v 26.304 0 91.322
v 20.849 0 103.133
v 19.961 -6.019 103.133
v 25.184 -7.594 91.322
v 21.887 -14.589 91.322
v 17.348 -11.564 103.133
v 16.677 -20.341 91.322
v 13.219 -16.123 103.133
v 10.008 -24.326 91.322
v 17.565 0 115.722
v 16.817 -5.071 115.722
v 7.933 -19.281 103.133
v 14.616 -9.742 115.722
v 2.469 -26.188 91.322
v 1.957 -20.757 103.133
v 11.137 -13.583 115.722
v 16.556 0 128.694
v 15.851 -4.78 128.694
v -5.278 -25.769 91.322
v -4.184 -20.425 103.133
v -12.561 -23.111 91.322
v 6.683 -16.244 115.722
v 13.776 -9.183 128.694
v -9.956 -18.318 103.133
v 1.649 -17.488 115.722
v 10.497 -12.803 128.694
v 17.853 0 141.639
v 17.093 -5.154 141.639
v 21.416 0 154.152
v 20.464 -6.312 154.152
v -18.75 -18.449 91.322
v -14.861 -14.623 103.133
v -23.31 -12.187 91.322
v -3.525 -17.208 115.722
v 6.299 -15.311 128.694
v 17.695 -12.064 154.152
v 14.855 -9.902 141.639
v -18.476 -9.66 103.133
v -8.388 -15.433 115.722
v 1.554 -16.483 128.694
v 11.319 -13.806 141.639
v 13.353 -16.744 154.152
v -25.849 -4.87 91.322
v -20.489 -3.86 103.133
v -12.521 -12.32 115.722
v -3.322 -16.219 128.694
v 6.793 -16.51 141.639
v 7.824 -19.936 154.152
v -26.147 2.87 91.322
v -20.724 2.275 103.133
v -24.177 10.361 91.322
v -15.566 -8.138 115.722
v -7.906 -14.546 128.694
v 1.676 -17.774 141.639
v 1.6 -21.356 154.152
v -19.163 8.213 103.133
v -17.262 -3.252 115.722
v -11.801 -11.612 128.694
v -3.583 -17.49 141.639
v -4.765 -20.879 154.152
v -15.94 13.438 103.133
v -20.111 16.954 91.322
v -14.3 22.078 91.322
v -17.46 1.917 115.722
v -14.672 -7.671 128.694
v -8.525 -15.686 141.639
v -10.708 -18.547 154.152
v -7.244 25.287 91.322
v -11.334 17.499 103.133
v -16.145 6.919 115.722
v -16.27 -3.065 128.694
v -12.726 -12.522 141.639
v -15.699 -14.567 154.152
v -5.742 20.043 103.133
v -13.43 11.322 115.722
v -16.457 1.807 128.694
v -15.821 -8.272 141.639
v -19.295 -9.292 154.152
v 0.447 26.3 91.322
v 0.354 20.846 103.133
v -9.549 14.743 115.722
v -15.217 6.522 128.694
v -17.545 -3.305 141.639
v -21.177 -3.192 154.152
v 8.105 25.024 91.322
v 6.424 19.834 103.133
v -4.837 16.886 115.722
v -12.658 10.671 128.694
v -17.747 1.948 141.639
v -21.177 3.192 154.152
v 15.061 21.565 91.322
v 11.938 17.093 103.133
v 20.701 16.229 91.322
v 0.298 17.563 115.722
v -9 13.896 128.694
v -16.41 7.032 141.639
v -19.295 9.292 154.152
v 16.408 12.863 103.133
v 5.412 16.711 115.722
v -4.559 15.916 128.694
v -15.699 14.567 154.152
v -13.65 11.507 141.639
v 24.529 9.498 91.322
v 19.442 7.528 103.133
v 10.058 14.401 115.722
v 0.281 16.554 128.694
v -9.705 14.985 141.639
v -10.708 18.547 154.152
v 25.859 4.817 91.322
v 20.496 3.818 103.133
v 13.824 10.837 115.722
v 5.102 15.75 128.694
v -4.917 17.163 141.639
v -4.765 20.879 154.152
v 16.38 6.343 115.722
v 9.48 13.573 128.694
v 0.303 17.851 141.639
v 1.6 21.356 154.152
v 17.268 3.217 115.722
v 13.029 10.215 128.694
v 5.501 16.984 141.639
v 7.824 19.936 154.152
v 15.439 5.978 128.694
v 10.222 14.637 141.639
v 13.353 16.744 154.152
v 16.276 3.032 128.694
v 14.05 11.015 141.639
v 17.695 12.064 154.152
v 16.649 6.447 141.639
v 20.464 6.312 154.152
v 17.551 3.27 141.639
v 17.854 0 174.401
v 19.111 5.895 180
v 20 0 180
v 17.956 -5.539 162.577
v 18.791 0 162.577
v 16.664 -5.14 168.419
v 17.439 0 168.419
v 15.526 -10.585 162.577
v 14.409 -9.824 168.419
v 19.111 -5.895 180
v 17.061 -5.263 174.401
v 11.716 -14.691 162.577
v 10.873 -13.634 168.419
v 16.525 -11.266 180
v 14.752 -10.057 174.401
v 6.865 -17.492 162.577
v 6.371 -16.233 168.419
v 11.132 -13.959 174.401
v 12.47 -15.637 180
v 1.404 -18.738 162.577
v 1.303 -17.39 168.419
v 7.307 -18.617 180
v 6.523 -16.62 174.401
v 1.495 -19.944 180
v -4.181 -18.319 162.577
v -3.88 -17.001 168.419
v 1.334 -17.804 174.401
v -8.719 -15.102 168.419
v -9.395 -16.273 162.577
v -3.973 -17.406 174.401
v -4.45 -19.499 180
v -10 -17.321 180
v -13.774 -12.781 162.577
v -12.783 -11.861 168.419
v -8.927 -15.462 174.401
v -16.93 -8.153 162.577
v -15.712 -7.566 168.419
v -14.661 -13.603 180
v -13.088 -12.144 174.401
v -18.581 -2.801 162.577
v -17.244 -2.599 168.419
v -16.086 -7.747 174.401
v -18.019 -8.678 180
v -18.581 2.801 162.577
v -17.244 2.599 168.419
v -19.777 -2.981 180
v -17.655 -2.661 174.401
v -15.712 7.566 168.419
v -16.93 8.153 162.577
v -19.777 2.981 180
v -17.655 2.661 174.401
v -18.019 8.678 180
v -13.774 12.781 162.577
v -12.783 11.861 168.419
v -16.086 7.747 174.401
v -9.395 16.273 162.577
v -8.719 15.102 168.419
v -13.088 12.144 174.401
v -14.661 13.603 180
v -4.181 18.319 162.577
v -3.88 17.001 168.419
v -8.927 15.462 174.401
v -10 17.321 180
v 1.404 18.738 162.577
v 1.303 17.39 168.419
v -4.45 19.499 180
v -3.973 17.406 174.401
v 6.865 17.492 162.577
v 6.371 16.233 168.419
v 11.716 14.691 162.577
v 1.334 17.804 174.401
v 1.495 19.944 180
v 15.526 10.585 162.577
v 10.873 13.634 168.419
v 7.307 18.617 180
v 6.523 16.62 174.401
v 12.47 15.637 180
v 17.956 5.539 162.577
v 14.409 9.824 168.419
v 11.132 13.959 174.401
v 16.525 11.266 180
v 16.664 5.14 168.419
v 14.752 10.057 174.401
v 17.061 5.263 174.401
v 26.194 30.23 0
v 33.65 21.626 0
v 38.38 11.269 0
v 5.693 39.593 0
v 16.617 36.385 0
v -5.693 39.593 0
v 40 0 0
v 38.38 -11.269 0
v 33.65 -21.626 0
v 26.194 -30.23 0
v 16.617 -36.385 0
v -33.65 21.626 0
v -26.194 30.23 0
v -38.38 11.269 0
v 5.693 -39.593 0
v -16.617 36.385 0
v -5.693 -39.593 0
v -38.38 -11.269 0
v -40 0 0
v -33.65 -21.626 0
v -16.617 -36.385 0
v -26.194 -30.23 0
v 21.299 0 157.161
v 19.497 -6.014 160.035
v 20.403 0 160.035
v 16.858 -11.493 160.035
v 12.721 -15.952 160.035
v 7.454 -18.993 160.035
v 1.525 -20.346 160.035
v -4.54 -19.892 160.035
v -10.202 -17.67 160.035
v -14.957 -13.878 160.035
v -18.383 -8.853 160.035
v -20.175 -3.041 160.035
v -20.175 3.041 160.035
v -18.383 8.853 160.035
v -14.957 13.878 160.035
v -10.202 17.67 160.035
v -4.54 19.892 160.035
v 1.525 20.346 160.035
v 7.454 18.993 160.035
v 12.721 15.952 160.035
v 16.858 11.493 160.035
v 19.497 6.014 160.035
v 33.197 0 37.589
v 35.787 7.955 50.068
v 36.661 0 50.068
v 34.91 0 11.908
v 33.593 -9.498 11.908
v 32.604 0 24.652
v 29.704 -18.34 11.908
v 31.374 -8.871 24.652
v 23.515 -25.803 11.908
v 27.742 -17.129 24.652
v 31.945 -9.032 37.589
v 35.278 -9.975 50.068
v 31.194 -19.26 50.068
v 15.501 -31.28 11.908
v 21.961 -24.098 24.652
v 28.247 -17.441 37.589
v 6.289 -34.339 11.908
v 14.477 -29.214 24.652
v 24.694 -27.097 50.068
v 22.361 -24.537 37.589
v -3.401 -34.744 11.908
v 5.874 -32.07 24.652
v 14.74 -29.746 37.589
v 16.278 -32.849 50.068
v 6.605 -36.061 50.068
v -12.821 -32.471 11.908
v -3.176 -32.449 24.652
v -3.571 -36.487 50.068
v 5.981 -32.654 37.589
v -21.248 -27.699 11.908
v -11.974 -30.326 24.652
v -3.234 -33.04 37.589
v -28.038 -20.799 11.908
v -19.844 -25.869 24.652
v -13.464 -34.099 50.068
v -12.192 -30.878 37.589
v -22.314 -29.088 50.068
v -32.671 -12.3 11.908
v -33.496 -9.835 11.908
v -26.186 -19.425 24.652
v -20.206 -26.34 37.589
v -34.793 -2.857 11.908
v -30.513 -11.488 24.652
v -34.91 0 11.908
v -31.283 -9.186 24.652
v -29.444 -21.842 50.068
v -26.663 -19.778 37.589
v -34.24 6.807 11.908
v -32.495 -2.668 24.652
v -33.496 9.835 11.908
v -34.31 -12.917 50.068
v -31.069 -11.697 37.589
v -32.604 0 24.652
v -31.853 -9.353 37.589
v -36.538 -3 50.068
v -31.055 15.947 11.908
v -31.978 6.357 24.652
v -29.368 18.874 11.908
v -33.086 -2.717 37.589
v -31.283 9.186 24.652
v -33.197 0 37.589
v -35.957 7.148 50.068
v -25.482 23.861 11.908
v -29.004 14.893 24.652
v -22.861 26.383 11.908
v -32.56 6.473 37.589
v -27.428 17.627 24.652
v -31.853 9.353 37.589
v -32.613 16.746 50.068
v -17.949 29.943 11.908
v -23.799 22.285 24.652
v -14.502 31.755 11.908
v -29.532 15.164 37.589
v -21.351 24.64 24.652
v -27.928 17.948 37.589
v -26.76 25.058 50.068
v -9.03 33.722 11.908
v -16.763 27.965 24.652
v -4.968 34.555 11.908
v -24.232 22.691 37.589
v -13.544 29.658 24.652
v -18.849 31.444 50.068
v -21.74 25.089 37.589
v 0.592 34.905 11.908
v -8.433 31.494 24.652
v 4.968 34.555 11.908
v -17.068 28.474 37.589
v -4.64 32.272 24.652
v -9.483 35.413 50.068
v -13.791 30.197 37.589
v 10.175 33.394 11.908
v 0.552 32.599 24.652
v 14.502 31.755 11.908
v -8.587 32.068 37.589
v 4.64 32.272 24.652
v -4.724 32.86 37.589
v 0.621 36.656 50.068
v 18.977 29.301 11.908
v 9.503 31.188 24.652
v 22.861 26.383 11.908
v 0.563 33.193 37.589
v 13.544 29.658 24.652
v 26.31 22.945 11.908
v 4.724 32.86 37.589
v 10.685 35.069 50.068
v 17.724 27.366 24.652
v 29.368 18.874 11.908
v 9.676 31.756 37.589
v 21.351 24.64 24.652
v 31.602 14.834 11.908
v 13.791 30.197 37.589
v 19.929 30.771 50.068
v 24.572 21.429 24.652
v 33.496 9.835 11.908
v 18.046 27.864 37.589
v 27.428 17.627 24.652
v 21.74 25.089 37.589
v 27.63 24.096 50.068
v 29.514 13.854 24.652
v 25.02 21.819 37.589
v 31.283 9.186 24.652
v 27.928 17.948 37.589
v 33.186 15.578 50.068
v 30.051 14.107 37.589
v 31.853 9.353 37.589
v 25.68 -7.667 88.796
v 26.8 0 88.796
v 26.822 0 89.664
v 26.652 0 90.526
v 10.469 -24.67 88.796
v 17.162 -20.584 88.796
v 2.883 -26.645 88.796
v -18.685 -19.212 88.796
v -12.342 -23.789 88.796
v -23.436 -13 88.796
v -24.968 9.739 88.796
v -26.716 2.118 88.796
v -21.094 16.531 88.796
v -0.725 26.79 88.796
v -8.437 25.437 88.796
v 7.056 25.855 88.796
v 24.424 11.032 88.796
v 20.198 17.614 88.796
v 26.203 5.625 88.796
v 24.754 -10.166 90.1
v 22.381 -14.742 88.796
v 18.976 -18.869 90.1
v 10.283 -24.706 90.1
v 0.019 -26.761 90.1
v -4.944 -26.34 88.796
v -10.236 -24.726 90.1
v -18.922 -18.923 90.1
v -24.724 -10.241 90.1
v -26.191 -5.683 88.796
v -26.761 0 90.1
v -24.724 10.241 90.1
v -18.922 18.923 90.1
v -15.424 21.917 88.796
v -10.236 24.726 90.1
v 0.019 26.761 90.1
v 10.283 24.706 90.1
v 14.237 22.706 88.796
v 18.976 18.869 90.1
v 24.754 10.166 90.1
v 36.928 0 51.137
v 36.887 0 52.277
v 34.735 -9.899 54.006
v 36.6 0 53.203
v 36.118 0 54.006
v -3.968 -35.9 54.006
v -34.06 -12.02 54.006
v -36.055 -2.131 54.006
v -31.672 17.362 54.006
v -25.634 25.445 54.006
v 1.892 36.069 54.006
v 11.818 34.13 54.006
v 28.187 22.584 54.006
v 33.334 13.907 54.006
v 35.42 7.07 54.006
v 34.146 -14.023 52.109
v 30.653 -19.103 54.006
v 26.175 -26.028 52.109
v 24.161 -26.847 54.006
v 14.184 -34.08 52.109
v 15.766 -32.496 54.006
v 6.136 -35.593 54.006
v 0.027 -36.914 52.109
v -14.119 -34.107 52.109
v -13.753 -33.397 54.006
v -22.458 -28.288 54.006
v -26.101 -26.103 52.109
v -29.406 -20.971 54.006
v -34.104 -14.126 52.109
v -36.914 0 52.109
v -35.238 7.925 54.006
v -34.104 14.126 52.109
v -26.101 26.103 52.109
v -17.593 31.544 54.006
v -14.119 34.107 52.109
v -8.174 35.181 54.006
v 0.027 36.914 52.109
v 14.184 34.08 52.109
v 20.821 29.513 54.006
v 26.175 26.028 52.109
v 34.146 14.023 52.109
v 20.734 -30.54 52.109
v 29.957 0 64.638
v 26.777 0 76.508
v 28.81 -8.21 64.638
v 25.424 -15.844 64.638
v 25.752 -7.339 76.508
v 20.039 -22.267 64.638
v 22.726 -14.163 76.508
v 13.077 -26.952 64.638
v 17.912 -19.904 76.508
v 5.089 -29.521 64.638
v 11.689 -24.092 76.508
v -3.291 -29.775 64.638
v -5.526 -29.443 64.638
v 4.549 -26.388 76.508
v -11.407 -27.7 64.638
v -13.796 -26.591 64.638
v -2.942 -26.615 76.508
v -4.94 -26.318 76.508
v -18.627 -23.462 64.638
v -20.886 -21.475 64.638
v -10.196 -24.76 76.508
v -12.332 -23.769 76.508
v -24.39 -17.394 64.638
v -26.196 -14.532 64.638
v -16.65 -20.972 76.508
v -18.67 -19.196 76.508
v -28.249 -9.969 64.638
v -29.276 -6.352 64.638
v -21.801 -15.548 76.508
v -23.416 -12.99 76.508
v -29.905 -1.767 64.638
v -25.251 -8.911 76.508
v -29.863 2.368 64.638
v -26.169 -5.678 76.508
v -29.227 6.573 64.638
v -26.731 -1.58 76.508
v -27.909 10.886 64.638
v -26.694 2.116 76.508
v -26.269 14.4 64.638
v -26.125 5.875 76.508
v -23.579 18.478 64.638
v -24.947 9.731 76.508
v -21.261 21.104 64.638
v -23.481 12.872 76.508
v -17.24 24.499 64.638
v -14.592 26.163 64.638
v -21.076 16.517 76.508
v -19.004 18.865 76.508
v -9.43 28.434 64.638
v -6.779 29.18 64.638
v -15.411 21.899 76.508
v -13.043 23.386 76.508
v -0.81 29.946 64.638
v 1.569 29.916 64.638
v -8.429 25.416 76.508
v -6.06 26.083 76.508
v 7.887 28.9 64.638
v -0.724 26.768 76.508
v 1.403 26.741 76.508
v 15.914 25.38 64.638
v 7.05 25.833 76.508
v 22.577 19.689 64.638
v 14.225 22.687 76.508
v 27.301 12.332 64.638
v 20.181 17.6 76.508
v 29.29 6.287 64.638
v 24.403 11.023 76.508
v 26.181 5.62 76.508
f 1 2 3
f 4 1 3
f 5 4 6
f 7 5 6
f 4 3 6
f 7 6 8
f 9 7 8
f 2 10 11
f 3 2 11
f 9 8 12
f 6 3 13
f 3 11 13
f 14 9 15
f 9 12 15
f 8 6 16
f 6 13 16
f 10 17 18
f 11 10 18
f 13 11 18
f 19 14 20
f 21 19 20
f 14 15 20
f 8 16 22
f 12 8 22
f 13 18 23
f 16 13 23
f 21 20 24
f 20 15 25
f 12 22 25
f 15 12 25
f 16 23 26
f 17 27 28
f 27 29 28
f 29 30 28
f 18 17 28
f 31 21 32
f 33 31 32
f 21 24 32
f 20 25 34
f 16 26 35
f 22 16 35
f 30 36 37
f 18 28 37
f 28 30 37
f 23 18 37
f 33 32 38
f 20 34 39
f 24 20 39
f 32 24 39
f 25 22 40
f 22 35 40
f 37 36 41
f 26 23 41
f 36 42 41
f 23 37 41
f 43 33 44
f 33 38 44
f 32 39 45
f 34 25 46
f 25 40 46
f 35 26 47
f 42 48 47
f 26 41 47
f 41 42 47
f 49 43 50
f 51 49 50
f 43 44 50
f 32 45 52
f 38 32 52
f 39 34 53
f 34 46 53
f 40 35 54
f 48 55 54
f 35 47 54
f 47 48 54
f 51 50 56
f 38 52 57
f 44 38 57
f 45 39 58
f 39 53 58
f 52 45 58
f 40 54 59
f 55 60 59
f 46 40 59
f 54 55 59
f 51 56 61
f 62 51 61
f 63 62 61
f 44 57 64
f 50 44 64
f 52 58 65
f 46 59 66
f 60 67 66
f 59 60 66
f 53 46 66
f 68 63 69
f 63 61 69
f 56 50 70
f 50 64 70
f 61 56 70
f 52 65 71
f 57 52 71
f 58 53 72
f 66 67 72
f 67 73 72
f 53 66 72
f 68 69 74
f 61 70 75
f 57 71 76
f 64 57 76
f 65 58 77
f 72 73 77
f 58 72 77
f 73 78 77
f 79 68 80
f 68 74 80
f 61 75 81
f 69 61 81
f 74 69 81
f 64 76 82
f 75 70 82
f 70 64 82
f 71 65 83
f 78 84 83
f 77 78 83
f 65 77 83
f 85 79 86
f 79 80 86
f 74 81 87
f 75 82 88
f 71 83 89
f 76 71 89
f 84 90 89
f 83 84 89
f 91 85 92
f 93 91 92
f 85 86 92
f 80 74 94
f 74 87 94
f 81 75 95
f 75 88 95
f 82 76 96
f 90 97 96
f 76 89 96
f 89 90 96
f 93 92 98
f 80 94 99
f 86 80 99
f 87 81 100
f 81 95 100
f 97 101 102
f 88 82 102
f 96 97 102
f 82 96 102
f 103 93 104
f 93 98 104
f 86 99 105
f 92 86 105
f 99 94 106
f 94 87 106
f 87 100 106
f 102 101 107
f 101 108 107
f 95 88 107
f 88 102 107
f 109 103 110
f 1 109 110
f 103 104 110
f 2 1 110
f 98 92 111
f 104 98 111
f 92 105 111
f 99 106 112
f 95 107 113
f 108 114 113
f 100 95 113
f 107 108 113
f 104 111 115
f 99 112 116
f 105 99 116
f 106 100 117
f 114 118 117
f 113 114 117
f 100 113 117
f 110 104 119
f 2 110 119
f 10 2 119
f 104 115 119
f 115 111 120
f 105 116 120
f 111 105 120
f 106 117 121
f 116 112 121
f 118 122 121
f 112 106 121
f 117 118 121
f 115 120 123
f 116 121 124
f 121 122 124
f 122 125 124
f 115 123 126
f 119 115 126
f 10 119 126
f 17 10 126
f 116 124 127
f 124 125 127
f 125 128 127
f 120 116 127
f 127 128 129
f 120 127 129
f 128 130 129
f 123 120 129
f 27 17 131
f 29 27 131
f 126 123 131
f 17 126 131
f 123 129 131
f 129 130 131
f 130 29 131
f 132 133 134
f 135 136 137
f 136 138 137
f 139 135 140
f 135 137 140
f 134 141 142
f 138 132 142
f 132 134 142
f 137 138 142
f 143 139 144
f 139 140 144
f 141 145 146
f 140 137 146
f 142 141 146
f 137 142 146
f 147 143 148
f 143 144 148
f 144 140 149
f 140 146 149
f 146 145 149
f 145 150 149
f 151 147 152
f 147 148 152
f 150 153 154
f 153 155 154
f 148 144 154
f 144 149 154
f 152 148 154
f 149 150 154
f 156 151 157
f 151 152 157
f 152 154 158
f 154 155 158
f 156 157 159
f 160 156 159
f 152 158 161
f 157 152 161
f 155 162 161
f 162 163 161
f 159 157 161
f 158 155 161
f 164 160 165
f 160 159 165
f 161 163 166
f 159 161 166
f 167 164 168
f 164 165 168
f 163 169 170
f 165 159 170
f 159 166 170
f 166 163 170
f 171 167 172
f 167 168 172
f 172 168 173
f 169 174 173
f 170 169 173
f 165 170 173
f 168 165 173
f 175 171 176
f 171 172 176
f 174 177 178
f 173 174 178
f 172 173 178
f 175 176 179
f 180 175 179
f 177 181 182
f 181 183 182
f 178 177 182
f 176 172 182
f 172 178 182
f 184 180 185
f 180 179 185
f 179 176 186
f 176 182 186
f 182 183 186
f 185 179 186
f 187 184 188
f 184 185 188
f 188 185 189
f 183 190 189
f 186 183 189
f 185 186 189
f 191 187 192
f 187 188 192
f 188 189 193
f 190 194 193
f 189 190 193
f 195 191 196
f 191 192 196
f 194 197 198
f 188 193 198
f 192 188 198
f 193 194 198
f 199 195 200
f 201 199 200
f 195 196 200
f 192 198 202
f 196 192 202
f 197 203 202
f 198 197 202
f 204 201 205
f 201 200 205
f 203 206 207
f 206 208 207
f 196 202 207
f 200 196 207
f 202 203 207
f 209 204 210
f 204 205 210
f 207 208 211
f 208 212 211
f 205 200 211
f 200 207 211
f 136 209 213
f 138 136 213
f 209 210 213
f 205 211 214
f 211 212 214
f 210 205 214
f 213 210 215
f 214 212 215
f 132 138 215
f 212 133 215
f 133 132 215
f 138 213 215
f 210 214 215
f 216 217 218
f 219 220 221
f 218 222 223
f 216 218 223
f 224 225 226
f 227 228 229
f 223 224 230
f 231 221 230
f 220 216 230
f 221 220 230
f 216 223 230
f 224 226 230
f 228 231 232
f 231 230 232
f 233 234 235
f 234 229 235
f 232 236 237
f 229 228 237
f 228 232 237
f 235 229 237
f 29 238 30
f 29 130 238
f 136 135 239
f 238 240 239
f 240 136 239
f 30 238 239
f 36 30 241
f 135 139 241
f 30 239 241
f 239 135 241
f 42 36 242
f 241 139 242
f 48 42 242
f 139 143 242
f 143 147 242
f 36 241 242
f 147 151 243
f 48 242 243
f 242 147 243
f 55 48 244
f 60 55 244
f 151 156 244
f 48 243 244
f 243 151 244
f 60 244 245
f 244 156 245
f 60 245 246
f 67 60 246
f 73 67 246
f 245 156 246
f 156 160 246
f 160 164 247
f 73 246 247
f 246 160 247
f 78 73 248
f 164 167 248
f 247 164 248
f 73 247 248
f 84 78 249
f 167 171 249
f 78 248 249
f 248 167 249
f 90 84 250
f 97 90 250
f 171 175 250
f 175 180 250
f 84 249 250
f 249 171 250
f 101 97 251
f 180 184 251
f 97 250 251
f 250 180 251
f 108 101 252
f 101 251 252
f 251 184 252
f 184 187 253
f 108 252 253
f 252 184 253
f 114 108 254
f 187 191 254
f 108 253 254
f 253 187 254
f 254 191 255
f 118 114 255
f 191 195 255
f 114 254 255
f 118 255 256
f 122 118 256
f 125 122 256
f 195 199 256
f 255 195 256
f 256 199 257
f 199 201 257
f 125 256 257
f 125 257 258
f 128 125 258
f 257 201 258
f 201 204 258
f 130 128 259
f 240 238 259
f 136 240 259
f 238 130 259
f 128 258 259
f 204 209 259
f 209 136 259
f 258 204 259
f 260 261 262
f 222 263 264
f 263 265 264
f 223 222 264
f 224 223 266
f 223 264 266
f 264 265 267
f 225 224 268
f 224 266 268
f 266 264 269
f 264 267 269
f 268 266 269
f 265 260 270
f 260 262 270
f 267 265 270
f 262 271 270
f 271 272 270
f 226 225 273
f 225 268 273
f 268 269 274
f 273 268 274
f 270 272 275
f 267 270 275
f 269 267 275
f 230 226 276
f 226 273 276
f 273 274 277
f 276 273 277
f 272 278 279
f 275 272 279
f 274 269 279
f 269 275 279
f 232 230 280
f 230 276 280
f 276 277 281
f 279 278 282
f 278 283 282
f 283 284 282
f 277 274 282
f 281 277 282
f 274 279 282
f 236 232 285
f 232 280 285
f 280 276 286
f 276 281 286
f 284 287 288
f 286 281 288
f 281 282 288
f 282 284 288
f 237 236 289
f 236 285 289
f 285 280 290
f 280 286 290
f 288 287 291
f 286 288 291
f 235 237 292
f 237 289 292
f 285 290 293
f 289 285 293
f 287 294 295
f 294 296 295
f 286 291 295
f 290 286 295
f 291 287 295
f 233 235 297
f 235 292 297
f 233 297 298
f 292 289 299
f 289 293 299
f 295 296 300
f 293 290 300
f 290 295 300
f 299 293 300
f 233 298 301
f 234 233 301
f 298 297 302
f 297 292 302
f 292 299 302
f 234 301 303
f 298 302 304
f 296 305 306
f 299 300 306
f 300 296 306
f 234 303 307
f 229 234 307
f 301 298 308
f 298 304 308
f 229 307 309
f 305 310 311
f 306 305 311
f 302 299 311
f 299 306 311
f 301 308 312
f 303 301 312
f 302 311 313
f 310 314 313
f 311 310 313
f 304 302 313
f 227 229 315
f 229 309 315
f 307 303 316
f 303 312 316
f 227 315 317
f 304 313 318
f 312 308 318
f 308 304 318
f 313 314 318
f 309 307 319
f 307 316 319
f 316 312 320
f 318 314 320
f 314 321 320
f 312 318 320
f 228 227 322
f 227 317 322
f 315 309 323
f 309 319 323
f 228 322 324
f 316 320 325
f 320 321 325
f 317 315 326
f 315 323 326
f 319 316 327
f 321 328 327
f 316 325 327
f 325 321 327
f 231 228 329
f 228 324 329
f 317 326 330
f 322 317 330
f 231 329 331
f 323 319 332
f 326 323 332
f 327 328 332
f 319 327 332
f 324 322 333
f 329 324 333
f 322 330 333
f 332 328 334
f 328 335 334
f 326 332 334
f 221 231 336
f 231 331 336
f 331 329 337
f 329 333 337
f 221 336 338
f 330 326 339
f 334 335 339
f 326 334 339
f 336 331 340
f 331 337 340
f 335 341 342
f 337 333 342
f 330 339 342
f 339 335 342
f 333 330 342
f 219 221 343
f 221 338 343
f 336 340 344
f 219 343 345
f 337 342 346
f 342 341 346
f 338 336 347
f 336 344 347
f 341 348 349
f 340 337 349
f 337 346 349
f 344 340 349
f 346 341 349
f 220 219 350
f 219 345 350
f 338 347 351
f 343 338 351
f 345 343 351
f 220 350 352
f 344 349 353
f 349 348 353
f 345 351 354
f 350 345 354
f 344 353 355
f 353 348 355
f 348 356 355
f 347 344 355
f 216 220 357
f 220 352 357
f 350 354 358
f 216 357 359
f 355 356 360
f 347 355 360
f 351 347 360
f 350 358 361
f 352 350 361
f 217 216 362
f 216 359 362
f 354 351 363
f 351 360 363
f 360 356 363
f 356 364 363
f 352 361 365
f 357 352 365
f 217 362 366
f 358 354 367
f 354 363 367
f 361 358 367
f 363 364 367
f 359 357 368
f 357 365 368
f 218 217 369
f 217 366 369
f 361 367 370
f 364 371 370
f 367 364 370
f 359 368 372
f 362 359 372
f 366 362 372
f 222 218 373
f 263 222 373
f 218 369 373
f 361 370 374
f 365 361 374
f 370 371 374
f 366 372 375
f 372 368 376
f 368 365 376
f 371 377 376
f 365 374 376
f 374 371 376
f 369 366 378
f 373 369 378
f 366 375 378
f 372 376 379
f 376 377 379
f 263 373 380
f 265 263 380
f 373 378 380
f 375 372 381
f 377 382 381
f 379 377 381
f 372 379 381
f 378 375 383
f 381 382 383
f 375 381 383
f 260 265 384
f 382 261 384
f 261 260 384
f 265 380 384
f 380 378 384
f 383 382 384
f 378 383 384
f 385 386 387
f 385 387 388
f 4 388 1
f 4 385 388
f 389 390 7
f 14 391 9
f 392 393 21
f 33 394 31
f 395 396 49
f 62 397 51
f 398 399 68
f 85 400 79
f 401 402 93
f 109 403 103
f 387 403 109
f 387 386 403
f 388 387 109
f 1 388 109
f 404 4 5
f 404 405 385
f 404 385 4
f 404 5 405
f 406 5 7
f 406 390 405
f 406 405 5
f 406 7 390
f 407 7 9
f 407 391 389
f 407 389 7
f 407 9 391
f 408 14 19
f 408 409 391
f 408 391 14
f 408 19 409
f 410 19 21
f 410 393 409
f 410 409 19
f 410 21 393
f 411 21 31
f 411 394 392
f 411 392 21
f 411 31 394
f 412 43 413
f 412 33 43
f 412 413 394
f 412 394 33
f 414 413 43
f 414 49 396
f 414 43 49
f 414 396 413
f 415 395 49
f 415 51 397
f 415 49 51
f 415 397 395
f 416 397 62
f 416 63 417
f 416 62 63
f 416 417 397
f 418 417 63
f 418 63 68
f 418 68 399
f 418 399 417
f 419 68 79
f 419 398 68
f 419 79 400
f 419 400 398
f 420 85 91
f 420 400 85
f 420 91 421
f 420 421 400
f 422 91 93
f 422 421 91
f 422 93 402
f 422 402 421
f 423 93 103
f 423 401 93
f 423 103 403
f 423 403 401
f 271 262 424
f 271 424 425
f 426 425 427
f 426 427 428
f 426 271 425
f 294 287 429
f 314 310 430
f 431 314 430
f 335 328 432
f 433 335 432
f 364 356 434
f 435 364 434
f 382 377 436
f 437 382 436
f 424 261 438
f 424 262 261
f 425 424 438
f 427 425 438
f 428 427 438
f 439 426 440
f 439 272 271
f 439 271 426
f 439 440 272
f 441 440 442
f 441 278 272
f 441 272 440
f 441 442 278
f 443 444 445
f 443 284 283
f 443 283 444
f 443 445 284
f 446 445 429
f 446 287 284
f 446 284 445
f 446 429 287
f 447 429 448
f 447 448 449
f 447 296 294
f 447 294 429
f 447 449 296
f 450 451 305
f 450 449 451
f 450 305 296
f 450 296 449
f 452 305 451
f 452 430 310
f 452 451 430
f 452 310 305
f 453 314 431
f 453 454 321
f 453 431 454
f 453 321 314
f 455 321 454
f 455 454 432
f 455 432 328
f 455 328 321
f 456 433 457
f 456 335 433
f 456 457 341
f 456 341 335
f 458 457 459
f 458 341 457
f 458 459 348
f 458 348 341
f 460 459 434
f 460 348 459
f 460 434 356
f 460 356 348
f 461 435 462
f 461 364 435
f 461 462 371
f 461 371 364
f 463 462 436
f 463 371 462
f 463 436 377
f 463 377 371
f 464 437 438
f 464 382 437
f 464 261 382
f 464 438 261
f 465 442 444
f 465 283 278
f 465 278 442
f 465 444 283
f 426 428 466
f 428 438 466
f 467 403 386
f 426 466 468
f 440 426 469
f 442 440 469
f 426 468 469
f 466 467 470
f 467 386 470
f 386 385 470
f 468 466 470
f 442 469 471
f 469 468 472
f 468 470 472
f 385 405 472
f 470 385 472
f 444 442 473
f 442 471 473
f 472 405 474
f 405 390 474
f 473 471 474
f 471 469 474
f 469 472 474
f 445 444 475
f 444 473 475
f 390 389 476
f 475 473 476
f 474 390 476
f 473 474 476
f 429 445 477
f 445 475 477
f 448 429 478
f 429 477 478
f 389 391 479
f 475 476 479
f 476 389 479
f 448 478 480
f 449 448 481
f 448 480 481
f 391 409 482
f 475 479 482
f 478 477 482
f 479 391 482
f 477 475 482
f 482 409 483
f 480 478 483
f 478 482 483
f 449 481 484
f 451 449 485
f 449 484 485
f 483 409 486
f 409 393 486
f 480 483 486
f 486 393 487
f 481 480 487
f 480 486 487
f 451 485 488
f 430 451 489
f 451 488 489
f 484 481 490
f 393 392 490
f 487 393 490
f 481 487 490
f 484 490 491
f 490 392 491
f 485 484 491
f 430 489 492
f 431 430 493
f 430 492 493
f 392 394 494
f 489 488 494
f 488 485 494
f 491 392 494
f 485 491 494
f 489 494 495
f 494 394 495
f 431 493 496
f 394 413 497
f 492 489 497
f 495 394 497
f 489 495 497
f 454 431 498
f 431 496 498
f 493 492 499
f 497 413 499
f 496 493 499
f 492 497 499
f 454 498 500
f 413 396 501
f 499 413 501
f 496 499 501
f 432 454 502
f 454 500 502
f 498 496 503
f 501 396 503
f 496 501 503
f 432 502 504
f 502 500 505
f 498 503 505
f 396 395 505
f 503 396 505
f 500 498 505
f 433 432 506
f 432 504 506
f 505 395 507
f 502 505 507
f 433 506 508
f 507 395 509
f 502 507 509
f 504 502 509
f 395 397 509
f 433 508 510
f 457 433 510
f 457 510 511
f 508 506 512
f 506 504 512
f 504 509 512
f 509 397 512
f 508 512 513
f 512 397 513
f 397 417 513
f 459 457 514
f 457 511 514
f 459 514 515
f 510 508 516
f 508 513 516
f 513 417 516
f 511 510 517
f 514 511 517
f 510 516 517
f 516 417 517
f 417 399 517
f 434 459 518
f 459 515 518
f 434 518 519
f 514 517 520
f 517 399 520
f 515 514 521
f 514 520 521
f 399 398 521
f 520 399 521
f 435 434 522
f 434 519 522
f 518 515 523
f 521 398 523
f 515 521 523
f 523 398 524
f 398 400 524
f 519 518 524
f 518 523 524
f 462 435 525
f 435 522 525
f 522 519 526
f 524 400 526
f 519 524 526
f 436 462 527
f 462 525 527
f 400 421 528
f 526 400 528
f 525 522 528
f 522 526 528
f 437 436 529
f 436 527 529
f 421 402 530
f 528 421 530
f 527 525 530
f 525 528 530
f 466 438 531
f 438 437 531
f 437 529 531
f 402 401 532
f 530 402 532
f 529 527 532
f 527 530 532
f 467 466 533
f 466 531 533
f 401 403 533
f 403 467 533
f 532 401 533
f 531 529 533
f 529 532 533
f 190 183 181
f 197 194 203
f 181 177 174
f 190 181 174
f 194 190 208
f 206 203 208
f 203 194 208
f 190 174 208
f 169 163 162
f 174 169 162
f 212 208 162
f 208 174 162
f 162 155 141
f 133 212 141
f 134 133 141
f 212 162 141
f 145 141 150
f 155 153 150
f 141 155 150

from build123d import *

# Parameters (mm, degrees)
F2_R = 4


with BuildPart() as f1:
    # F0 (on Front) → F1 (revolve)
    with BuildSketch(Plane.XZ):
        with BuildLine():
            Line((0, 180), (0, 0))
            Line((0, 0), (40, 0))
            ThreePointArc((40, 0), (32.538114, 25.815038), (37.575505, 52.210504))
            ThreePointArc((37.575505, 52.210504), (28.101816, 70.006211), (26.999903, 90.136381))
            ThreePointArc((26.999903, 90.136381), (16.82912, 121.500761), (21.415917, 154.152415))
            ThreePointArc((21.415917, 154.152415), (20.945571, 158.627031), (18.790591, 162.576649))
            ThreePointArc((18.790591, 162.576649), (17.424024, 171.425157), (20, 180))
            Line((20, 180), (0, 180))
        make_face()
    revolve(axis=Axis((0, 0, 49.245128), (0, 0, -1)))

    # F2
    f2_edges = [f1.edges().sort_by_distance(p)[0] for p in [
        (-37.575505, 0, 52.210504),
        (-26.999903, 0, 90.136381),
    ]]
    fillet(f2_edges, radius=F2_R)


solid = f1.part
